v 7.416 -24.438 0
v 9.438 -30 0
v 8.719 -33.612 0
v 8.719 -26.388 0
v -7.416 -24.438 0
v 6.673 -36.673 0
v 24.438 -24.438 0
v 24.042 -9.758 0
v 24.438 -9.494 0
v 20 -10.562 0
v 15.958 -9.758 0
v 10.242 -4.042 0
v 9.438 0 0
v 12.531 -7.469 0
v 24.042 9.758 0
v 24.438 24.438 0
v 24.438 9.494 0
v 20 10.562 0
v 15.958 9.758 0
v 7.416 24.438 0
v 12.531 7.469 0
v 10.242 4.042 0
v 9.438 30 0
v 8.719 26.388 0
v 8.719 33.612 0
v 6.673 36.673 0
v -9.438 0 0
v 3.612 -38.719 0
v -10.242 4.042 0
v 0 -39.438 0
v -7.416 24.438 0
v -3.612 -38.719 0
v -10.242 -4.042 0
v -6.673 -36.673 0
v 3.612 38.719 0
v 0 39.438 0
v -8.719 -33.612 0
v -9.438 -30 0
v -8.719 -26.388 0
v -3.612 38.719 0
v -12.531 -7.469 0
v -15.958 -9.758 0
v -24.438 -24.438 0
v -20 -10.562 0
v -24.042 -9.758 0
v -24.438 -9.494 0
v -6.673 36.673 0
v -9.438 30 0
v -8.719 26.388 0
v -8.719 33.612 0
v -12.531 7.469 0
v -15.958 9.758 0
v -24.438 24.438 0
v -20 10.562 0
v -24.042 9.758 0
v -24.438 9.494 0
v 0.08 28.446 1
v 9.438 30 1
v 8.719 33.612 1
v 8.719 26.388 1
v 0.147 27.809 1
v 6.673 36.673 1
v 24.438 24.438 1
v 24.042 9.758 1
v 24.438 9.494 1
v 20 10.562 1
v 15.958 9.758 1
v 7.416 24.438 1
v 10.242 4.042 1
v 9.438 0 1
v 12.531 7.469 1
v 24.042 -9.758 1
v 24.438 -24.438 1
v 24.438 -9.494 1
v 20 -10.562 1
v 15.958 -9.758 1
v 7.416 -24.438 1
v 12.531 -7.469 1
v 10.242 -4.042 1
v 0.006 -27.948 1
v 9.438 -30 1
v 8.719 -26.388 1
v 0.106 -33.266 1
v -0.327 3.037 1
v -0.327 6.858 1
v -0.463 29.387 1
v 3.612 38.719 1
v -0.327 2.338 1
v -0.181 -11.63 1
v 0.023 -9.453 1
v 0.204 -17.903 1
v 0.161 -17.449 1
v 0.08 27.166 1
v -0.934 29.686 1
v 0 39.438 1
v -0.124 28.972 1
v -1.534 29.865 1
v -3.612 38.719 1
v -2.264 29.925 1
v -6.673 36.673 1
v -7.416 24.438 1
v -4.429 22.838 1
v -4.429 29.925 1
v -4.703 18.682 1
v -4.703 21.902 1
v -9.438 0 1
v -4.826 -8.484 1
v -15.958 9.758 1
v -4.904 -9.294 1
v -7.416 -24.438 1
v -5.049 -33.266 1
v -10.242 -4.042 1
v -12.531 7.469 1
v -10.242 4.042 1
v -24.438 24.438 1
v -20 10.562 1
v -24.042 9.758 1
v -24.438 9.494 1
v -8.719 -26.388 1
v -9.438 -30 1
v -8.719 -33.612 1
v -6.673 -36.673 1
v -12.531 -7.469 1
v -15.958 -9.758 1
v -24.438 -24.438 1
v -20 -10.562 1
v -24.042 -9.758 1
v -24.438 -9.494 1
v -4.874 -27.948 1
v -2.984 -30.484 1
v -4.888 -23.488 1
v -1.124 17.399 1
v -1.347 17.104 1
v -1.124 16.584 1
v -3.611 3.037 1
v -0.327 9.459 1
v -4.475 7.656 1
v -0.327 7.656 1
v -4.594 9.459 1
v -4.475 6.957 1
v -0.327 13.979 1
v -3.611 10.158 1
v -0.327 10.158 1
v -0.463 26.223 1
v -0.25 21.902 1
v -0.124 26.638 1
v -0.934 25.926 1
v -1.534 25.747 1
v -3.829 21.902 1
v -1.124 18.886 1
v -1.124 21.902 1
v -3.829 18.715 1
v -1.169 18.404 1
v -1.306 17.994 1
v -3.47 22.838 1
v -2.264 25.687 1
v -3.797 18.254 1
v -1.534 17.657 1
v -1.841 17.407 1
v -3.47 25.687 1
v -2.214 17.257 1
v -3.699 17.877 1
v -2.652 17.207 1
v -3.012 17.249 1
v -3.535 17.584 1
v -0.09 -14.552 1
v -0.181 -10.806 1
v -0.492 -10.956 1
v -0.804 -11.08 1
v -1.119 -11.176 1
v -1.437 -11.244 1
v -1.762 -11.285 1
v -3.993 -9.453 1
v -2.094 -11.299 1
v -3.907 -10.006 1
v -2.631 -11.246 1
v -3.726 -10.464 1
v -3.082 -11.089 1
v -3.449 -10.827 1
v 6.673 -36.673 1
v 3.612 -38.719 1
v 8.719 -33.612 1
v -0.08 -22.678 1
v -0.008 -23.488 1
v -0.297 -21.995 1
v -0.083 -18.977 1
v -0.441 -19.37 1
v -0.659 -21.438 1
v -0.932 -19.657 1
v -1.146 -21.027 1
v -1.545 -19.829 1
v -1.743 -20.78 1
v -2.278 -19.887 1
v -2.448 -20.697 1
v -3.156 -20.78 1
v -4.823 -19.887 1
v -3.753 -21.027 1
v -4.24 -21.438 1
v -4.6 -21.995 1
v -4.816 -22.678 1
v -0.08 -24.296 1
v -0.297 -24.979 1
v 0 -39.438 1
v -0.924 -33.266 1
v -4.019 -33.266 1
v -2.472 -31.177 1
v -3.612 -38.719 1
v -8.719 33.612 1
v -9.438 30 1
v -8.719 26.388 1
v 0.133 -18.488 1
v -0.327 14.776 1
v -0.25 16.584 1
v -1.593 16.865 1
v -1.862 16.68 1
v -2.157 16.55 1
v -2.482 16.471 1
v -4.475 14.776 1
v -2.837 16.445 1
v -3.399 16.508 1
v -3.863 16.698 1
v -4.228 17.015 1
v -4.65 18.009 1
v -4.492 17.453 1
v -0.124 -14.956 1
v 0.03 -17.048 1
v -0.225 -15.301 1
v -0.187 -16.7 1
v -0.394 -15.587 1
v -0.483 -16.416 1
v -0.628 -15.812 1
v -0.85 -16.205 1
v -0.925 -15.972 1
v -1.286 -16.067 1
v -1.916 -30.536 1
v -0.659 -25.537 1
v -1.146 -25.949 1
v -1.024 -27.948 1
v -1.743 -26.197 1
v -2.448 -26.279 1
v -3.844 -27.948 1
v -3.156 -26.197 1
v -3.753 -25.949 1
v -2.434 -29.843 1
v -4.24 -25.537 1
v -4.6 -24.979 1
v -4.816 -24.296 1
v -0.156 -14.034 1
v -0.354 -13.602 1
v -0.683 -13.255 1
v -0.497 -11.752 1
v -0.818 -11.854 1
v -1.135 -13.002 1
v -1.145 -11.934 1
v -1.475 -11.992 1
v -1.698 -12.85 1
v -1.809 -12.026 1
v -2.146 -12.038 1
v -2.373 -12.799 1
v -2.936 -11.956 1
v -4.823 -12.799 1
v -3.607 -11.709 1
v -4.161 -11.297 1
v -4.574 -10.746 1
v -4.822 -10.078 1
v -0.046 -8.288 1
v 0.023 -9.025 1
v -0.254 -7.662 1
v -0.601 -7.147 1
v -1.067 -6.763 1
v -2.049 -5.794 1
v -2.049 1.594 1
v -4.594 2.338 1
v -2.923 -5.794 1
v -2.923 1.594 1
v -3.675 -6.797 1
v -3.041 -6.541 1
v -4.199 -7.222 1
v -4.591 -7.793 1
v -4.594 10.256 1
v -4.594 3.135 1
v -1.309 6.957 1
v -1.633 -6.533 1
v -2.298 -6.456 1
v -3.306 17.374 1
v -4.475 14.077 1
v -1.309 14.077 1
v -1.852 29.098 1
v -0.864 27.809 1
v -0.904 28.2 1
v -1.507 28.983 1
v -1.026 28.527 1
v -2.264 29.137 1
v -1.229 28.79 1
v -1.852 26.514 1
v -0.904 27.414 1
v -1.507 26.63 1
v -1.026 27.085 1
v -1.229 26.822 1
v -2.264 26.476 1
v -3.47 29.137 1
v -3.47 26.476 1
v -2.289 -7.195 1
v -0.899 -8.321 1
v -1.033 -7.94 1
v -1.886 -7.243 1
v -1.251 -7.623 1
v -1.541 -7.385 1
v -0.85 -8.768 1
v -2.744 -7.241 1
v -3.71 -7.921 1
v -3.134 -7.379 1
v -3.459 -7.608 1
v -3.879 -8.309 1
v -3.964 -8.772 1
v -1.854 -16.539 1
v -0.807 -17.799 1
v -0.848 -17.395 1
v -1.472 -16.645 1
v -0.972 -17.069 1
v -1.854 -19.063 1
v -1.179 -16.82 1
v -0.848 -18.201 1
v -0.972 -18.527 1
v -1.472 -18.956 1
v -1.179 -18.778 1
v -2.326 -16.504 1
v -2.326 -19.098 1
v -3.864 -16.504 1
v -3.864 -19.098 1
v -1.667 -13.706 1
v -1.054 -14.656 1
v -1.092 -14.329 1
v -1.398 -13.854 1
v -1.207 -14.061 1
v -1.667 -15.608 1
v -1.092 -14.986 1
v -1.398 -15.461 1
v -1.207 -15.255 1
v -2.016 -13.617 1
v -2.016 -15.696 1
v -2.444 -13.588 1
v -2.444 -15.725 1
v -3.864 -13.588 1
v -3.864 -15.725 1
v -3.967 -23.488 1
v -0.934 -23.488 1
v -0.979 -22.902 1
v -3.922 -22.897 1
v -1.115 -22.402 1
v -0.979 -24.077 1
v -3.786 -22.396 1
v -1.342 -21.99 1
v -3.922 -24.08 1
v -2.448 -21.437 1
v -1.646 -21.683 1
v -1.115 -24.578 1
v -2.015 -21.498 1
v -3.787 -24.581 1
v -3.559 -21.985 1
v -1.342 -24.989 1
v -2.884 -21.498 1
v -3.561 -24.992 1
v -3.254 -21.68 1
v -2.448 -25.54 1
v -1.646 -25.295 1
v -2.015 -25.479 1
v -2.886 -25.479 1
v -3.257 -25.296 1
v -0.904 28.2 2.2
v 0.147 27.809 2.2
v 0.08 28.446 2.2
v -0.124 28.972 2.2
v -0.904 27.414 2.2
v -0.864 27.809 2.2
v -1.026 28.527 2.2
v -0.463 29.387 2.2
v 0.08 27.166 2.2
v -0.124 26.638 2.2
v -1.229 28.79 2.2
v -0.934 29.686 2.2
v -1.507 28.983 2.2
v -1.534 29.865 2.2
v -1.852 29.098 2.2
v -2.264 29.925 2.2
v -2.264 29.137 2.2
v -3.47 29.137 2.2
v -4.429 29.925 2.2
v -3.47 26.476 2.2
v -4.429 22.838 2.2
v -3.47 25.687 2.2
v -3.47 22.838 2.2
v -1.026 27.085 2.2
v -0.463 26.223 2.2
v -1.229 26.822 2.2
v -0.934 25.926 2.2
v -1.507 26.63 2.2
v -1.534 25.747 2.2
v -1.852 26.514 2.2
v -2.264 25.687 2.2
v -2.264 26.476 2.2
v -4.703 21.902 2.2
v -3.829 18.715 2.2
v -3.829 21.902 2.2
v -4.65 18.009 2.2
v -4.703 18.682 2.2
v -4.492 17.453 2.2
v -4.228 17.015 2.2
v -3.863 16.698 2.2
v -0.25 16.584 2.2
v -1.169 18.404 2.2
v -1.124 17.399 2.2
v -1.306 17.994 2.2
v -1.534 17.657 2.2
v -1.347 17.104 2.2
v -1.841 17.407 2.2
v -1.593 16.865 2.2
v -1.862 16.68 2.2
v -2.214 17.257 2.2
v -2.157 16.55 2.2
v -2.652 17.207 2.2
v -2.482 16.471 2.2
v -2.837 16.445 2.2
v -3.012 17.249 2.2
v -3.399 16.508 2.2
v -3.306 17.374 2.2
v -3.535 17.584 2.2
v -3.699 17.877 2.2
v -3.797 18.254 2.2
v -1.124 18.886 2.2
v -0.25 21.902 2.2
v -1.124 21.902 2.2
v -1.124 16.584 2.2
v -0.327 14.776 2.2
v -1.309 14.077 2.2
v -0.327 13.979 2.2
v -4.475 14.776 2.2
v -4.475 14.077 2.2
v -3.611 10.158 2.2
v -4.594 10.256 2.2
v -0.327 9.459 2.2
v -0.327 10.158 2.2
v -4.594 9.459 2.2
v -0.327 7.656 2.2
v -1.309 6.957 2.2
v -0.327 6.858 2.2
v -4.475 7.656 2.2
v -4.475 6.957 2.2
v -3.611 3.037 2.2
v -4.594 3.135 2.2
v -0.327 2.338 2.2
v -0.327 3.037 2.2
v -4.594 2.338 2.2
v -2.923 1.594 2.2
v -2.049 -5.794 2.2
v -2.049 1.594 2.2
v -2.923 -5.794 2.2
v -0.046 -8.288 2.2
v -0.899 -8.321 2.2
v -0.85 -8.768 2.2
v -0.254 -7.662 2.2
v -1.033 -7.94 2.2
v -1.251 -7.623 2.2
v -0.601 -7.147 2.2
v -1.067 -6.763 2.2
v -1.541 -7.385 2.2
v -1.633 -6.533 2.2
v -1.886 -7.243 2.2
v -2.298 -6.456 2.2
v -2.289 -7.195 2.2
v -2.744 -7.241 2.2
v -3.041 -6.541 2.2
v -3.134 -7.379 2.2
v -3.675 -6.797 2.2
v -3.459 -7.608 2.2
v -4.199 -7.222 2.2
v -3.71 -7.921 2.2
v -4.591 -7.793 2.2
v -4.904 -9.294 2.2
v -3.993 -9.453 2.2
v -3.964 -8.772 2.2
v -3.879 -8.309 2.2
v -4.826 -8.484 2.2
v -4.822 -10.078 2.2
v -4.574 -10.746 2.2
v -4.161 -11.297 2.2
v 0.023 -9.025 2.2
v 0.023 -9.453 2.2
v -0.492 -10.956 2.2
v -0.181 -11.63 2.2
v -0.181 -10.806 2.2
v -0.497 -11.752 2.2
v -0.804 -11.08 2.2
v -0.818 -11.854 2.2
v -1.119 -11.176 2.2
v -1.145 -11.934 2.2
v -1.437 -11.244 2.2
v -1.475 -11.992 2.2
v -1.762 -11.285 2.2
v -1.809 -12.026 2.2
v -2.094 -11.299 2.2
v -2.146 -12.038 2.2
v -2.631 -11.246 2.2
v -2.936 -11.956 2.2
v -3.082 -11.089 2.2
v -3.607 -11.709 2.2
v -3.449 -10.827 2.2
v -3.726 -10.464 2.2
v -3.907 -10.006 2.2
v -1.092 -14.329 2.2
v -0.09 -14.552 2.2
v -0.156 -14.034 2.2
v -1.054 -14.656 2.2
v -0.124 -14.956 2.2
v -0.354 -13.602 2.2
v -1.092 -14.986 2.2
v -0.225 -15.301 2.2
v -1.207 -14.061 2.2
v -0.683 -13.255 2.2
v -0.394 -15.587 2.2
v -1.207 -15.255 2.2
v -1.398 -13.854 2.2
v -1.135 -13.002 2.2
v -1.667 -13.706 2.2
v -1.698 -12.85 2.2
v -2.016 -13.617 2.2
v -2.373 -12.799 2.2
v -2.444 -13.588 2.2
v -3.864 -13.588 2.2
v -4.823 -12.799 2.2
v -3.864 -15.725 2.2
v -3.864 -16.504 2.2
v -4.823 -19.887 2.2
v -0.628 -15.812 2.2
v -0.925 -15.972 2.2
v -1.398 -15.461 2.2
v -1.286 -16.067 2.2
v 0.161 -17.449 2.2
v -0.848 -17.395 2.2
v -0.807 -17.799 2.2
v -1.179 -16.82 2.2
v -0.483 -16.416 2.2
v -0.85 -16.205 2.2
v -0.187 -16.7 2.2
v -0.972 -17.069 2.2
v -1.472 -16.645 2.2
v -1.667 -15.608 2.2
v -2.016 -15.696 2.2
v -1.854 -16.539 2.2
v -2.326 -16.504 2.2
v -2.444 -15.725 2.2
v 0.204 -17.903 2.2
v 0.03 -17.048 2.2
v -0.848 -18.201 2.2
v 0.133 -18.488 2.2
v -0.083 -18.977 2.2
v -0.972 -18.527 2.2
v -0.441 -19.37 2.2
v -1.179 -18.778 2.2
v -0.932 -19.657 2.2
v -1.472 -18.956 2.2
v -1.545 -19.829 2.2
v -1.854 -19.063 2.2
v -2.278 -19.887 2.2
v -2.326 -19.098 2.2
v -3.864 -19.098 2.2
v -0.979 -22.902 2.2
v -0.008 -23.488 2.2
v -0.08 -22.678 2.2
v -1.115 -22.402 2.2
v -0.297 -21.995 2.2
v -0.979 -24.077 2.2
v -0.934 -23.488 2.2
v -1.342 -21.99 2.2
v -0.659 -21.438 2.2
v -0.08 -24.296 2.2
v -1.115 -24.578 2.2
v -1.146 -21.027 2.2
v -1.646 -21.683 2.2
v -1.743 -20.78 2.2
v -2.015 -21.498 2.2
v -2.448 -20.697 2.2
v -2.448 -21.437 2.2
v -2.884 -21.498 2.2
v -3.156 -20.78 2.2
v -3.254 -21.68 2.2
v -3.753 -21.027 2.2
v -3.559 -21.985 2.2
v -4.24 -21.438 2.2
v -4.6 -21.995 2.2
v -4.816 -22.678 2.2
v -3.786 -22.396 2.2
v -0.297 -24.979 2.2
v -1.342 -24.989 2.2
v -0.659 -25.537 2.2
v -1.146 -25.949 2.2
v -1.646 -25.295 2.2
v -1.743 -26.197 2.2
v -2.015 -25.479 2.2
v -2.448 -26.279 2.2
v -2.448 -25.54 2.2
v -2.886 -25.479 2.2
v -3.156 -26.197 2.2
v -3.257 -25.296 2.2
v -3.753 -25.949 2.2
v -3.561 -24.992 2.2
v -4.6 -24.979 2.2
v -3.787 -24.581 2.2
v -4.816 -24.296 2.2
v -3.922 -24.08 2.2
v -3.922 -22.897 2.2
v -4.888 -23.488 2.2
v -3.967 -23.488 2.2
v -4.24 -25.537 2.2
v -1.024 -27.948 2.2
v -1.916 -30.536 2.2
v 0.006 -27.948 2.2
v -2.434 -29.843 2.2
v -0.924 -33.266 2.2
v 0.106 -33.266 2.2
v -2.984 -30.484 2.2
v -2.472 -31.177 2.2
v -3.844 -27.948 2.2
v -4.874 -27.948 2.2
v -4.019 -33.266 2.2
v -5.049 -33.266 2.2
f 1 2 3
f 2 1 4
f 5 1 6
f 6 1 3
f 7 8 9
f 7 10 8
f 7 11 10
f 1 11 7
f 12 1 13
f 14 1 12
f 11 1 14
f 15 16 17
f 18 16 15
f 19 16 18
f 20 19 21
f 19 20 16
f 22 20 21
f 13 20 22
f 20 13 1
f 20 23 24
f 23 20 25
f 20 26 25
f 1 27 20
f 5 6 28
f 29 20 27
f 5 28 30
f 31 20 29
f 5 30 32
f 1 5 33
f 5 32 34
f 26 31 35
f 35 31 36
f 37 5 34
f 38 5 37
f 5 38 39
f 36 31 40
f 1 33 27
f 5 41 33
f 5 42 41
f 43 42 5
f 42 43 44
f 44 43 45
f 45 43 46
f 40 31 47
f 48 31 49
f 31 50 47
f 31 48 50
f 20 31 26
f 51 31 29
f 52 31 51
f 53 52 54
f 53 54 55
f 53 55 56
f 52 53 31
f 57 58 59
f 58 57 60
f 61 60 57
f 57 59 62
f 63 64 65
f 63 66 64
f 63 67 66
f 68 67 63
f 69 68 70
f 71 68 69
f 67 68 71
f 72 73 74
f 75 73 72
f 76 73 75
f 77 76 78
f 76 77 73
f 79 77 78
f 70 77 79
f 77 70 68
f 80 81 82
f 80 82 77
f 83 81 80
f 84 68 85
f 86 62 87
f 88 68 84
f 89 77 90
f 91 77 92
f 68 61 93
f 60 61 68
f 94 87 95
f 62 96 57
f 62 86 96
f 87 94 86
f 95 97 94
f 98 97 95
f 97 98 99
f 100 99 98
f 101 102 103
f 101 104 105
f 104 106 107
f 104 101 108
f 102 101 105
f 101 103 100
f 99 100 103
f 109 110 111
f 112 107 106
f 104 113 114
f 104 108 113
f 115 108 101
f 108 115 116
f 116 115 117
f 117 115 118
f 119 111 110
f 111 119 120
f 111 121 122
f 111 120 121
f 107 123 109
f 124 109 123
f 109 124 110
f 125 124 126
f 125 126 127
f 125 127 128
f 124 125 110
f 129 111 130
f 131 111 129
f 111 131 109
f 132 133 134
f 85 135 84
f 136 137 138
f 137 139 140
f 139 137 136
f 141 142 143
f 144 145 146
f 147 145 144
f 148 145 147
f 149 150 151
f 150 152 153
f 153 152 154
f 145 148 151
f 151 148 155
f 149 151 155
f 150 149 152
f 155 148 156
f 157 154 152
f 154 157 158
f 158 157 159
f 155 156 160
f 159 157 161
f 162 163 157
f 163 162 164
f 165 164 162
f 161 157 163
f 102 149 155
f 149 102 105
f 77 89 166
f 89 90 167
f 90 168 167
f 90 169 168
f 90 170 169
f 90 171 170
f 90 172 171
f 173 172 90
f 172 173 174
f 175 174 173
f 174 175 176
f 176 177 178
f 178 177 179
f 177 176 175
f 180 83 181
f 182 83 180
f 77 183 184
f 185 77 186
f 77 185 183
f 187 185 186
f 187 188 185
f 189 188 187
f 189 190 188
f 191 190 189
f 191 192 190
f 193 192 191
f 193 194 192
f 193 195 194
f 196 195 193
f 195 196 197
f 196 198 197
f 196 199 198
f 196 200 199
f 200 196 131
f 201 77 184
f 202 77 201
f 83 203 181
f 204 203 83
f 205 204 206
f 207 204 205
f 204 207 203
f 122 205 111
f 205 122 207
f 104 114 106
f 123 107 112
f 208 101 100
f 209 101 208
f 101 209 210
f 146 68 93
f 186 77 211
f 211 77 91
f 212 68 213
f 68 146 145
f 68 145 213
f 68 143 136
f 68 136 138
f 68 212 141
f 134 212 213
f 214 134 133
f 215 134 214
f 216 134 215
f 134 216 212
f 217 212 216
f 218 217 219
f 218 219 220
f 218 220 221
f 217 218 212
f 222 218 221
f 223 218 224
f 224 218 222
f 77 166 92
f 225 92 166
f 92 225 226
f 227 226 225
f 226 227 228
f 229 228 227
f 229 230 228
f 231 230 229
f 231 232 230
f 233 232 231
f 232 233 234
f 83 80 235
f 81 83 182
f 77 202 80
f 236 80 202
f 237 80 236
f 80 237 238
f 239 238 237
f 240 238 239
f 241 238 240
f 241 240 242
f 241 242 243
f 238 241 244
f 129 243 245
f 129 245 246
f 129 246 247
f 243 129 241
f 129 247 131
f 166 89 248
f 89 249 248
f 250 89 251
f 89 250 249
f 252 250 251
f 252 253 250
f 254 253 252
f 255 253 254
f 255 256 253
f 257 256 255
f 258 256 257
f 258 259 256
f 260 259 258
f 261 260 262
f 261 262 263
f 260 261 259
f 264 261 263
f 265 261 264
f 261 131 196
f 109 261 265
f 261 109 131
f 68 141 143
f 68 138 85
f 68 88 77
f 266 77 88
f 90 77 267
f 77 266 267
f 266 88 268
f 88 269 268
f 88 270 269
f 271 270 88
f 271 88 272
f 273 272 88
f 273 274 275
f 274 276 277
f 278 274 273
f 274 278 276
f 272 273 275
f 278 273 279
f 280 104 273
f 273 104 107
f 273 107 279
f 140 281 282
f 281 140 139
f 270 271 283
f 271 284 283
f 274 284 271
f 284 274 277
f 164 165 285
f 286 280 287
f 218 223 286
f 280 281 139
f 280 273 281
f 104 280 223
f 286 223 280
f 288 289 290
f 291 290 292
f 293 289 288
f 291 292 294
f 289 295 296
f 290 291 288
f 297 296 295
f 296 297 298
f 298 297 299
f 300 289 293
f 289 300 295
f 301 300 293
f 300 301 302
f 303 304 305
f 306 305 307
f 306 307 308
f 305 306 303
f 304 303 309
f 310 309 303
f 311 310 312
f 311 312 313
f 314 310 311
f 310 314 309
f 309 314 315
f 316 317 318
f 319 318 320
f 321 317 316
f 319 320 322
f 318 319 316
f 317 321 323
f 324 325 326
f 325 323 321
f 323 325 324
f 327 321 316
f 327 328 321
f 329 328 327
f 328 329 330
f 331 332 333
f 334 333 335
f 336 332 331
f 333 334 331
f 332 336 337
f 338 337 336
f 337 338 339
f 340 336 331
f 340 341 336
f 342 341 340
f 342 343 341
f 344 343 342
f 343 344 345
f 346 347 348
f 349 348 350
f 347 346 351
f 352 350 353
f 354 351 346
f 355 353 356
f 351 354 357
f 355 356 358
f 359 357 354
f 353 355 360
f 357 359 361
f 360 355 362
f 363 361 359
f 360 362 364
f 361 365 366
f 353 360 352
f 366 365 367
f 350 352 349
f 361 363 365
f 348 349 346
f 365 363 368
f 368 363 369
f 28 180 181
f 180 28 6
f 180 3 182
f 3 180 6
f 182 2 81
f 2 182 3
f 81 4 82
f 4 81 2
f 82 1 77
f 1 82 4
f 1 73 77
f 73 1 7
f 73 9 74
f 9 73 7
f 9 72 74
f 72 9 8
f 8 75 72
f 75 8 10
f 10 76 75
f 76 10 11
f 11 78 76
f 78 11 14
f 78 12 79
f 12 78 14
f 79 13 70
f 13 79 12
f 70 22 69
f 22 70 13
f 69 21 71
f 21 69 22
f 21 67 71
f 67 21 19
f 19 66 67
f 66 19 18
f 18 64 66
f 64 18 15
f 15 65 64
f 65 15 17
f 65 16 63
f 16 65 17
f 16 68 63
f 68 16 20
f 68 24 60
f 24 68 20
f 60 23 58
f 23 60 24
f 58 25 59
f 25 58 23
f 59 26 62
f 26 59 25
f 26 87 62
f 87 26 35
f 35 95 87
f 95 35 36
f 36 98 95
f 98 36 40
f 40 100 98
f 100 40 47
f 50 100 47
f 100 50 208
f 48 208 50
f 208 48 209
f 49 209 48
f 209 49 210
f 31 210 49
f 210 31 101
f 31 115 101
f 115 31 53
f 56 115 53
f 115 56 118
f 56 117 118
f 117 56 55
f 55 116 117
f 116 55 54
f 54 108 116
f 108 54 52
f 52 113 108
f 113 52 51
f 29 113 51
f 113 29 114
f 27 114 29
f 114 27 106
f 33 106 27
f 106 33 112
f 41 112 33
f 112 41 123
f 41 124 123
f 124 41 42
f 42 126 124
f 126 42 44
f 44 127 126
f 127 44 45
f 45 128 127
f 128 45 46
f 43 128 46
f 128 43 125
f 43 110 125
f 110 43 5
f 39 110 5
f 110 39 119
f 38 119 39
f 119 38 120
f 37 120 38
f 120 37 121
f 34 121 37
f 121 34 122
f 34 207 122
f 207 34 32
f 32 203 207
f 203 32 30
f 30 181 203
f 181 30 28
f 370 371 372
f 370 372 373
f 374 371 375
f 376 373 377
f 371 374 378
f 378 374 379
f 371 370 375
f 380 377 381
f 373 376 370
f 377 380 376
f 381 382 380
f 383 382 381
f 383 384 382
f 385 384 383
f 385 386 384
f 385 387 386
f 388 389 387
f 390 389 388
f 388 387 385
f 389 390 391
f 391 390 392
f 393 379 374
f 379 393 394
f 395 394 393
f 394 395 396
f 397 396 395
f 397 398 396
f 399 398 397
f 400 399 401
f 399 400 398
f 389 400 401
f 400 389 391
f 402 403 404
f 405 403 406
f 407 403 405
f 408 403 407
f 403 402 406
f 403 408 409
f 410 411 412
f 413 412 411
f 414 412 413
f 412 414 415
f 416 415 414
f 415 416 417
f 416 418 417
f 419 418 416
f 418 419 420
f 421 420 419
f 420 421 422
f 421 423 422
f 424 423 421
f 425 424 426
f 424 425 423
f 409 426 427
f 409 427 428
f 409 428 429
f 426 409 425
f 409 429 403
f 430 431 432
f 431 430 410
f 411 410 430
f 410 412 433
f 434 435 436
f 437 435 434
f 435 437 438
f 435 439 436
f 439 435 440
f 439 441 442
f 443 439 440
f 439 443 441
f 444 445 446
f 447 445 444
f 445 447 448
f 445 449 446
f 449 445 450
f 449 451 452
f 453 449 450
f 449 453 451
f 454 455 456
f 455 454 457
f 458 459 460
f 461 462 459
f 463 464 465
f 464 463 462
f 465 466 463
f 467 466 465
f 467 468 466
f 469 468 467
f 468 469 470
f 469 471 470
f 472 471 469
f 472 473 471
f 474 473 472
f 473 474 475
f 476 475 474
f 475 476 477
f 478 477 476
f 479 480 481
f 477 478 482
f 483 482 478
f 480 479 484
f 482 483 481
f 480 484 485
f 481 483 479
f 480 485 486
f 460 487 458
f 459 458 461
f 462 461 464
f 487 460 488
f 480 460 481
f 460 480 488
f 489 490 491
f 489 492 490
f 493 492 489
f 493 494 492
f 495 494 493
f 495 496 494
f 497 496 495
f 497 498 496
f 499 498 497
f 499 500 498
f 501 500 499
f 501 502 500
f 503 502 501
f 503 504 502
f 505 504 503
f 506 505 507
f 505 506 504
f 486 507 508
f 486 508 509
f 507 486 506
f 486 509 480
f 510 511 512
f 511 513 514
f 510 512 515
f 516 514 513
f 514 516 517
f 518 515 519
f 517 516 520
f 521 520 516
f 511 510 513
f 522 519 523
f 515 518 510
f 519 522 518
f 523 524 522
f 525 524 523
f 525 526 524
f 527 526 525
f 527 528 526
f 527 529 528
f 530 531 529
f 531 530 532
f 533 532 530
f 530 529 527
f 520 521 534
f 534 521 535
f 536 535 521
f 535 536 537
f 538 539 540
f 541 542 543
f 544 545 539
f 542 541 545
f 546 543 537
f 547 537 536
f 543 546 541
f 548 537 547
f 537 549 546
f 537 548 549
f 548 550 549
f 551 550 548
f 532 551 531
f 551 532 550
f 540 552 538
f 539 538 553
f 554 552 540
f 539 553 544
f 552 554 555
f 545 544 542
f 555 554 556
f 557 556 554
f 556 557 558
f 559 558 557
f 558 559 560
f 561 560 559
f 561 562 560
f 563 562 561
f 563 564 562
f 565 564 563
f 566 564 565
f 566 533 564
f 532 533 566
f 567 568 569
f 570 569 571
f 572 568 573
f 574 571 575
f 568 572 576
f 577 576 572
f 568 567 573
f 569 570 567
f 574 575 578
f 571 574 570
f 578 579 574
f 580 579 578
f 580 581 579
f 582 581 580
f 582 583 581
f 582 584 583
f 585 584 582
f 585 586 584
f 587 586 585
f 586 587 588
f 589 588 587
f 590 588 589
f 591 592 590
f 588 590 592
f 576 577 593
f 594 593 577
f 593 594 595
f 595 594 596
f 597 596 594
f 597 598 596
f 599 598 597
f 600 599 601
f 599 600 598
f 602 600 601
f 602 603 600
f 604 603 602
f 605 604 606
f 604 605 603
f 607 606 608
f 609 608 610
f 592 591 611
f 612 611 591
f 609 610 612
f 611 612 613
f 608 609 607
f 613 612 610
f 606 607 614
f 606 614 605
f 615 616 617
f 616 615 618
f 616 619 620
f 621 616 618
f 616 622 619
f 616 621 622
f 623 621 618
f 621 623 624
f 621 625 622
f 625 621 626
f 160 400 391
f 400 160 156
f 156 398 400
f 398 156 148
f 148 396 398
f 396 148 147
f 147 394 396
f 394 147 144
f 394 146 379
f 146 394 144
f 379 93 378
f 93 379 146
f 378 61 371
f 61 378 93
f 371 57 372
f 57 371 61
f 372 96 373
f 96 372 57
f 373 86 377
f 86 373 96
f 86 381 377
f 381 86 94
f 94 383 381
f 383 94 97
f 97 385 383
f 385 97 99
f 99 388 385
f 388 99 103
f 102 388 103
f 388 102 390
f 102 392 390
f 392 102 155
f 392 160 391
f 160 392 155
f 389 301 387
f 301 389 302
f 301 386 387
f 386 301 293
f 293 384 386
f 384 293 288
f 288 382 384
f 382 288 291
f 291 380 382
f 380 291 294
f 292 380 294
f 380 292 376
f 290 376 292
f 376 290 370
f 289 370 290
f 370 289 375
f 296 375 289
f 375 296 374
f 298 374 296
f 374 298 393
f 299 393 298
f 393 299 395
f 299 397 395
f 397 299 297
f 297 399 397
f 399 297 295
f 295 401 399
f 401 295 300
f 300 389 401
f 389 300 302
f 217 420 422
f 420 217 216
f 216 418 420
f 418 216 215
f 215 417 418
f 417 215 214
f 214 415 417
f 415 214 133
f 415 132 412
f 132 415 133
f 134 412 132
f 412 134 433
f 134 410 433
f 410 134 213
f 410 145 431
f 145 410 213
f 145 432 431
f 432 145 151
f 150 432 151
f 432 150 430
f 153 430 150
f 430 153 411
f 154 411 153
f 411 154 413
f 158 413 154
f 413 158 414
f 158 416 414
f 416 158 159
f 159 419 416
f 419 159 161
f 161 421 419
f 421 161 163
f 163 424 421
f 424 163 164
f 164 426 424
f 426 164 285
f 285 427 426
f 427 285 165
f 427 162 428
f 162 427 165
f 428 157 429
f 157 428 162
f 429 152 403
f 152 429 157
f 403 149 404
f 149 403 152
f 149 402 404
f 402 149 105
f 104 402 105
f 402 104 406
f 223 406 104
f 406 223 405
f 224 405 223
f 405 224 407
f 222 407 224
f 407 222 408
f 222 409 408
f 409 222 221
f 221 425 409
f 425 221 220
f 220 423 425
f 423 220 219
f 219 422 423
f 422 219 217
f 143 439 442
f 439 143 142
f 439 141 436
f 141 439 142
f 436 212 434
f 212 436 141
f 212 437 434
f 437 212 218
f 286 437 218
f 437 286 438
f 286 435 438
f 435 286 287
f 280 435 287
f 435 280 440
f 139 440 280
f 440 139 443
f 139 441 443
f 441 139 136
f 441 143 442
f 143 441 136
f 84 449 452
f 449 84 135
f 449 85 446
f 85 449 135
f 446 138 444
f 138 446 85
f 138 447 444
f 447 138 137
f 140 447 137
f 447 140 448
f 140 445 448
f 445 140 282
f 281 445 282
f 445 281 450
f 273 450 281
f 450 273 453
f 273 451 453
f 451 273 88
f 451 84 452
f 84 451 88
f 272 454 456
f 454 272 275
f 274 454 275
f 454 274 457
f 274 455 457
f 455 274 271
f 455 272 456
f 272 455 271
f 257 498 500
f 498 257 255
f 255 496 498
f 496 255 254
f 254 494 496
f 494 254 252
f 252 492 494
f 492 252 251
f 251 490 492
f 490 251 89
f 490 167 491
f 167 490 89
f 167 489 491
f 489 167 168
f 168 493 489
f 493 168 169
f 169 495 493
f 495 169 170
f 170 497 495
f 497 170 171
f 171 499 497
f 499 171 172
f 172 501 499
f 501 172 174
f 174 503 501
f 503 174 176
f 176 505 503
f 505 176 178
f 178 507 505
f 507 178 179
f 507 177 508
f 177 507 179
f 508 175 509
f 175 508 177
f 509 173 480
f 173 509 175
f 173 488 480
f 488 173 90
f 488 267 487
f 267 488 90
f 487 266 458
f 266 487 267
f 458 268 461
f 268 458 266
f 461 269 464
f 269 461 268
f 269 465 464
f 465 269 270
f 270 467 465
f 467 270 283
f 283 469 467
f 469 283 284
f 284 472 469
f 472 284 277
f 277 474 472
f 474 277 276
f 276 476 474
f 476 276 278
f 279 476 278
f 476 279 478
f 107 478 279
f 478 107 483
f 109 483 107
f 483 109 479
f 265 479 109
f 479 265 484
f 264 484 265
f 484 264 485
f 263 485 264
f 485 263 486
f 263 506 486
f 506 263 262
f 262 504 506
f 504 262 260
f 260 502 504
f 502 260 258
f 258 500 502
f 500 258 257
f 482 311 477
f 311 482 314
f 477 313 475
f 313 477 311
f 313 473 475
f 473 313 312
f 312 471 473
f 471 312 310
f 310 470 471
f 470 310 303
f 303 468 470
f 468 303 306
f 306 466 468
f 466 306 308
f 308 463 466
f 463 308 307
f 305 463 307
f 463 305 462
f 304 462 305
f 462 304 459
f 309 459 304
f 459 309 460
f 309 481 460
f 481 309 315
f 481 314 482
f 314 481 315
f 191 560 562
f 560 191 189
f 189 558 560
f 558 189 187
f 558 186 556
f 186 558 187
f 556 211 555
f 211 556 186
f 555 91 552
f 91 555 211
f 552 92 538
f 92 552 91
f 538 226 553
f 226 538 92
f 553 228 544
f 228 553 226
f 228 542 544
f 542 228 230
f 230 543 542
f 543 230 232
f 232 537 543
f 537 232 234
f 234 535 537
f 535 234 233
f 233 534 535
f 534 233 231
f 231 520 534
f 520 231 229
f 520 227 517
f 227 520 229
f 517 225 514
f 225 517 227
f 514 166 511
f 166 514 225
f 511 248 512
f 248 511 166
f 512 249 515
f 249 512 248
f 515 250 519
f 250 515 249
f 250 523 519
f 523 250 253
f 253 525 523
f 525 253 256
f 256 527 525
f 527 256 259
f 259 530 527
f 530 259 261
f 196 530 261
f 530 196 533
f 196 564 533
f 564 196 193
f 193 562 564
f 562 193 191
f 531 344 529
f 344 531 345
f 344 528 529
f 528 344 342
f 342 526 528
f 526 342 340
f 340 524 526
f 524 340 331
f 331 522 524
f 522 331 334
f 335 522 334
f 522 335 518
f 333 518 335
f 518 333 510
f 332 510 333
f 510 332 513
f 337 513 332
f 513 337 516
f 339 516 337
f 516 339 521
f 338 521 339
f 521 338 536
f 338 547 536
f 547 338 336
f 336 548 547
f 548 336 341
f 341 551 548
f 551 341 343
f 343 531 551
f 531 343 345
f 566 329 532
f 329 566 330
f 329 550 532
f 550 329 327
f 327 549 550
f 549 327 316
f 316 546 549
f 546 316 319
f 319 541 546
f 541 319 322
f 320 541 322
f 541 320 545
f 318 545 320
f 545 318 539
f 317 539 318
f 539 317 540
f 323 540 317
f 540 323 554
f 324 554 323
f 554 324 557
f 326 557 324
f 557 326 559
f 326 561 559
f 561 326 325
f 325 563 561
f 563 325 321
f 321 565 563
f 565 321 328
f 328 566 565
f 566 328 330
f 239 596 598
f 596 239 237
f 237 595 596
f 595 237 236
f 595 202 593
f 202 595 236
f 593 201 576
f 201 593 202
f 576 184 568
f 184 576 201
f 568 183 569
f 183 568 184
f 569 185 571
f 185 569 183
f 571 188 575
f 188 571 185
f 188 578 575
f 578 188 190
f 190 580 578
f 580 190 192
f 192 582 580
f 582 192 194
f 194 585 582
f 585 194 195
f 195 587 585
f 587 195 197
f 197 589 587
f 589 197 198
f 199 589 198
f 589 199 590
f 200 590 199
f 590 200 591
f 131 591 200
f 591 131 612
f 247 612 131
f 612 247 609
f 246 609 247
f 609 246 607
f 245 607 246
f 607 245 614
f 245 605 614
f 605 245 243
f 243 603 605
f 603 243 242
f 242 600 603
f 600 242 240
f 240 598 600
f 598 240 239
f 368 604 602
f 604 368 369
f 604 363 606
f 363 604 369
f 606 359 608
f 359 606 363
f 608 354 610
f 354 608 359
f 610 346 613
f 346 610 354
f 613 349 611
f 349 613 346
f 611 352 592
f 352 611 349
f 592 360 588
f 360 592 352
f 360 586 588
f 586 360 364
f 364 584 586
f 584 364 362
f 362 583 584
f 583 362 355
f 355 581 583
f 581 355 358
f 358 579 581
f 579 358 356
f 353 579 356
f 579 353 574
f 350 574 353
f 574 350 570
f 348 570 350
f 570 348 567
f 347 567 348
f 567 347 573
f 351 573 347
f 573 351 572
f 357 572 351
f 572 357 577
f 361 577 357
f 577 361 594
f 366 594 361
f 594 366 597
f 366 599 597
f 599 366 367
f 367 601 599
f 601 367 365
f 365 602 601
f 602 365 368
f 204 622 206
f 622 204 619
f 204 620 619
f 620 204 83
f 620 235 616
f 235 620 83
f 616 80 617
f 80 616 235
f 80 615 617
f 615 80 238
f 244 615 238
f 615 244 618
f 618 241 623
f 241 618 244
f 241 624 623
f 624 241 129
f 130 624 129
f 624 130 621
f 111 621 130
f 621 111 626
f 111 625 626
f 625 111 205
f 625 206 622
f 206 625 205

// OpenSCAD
height = 50; //mm
sizeX = 50; //mm Size of piece on x axis
sizeY = 50; //mm Size on y axis

piece_size = 50;//mm Size of the main square [sizeX,sizeY]; //mm,mm Size of puzzle box
joint_radius = 10; //mm Radius of joints

joint_numerator = 6;
joint_denomenator = 10;

joint_diffnumerator = joint_denomenator-joint_numerator;

outward = (joint_numerator/joint_denomenator);
inward = (joint_diffnumerator/joint_denomenator);
thickness=.45; // Do not set this below your default extrusion width or you WILL get bad underextrusion on the straight parts! If they even show up once sliced. Also if you have the walls too thick you will need to have support on the top part. Or might need them anyways. TIP: when printing in clear set it to exactly your extrusion width for best clarity.
lid_thickness=1; //mm Thickness of the lid
lip_thickness=.45; //mm Thickness of the lip near the top of the puzzlebox bottom
text_thickness=1.2; //mm Thickness of the text
tolerance=0.075; //mm Extra gap between parts
top = true;

top_text = "PuzzleBox"; // Text to add to the top of the box.
top_textsize = 7; // size param for text
top_font = "Linux Libertine Mono O:stype=Bold"; // Font for the text
text_spacing = .75; // Spacing of text

text_direction="ttb"; // Direction of text

text_rotation=0; //° Rotation of text
text_resolution=80; // Resolution of text, the $fn of the function.
text_posx=0;
text_posy=0; // NOTE: font appears to be offset by -1, adjusted in code.
module puzzlepiece(size,radius,size_ext=0) {
	ext=size_ext+tolerance;
	union() {
		difference() {
			square(size-(ext*2),center=true);
			translate([size*inward,0]) circle(radius+ext,$fn=16);
			translate([-size*inward,0]) circle(radius+ext,$fn=16);
		}
		translate([0,size*outward]) 	circle(radius-ext,$fn=16);
		translate([0,-size*outward]) 	circle(radius-ext,$fn=16);
	}
}
if (top == false) {
//echo(inward,outward);
difference() {
	linear_extrude(height+thickness) puzzlepiece(piece_size,joint_radius);
	translate([0,0,thickness*3]) 	linear_extrude(height+(thickness*2)) puzzlepiece(piece_size,joint_radius,thickness);
}
linear_extrude(height-lid_thickness) difference() {
			puzzlepiece(piece_size,joint_radius,thickness);
			puzzlepiece(piece_size,joint_radius,thickness+lip_thickness);
}
} else {
	linear_extrude(lid_thickness) puzzlepiece(piece_size,joint_radius,thickness+(tolerance/2));
	//translate([0,0,lid_thickness]) linear_extrude(thickness) puzzlepiece(piece_size,joint_radius);
	translate([text_posx,text_posy-1,lid_thickness]) rotate([0,0,text_rotation]) linear_extrude(text_thickness) text(text=top_text,size=top_textsize,font=top_font,halign="center",valign="center",spacing=text_spacing,direction=text_direction);
}
	
